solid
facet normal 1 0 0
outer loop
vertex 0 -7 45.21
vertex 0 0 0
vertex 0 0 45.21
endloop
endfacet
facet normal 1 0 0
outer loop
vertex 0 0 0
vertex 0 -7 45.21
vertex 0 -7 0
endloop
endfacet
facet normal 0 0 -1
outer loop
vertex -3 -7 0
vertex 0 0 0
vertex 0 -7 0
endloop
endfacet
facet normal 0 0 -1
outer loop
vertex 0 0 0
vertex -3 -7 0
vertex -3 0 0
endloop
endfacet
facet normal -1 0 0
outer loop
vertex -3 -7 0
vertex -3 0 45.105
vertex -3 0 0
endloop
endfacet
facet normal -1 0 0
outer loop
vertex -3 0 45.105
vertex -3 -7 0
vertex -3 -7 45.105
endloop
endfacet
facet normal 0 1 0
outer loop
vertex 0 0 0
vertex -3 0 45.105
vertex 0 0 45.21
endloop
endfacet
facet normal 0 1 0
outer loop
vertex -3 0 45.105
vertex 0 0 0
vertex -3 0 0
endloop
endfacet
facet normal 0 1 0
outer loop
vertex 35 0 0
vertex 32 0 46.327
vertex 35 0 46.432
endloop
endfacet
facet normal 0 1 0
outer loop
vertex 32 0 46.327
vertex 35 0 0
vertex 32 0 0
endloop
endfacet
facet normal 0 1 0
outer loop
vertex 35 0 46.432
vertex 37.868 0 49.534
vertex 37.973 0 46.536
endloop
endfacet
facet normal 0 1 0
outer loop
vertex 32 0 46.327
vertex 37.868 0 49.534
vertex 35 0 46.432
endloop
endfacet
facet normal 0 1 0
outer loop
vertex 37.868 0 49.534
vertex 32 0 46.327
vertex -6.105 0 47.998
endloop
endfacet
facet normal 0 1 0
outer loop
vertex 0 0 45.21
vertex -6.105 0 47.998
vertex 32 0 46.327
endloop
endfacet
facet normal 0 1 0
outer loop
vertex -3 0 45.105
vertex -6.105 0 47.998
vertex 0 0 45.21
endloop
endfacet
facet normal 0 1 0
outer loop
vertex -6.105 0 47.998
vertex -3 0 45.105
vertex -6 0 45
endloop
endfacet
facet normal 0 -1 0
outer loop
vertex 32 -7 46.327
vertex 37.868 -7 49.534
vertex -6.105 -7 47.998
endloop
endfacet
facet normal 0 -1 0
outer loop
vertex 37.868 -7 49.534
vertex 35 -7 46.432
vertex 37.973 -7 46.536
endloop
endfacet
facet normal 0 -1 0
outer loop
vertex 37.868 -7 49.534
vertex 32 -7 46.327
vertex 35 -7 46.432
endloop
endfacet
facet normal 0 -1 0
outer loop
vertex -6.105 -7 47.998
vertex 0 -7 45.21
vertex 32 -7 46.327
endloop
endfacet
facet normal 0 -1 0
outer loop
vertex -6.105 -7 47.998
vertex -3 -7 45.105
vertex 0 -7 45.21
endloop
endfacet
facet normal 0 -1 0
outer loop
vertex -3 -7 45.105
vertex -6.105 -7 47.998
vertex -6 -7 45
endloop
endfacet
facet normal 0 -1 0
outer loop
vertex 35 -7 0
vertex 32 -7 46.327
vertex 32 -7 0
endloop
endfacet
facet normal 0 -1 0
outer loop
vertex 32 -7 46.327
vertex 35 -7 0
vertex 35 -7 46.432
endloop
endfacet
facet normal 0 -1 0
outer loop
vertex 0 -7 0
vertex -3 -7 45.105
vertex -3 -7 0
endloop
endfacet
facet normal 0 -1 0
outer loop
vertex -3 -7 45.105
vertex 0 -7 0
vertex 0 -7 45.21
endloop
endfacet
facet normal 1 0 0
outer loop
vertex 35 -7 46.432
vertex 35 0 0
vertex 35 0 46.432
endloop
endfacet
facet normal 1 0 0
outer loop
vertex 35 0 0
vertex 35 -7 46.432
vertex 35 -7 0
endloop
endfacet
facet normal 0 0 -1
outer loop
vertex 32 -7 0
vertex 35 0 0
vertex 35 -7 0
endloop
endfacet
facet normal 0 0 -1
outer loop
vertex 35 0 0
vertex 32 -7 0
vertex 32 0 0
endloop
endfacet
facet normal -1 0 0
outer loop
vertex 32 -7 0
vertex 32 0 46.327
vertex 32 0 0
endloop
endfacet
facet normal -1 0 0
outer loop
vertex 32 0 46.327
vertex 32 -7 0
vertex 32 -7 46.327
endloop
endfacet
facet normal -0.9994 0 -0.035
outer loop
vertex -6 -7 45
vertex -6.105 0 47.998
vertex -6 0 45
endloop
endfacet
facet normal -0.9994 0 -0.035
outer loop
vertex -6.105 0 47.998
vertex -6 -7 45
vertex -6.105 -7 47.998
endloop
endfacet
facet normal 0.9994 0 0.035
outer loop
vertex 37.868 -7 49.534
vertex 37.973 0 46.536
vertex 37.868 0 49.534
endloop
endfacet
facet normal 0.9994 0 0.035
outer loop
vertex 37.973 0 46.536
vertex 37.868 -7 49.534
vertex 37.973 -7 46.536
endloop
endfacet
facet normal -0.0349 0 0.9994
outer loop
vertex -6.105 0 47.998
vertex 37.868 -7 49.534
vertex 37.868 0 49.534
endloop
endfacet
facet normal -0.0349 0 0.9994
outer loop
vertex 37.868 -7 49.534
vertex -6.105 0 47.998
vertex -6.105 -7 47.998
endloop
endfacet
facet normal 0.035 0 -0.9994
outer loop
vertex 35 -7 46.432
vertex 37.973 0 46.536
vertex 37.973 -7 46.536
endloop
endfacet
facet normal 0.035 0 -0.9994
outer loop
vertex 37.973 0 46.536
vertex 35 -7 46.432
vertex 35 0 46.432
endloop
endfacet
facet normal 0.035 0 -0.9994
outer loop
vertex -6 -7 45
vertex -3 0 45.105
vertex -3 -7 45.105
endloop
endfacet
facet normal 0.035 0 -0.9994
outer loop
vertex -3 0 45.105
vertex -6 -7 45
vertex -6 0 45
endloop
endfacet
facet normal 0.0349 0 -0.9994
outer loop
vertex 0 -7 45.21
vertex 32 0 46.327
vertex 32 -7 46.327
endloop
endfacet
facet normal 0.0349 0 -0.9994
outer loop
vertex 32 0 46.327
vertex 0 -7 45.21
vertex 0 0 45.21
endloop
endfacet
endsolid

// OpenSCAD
/* dooropening.scad
 *
 * Copyright (C) Robert B. Ross, 2016
 *
 * This software is released under the Creative Commons
 * Attribution-ShareAlike 4.0 International Public License.
 */

doorOpening();

/* doorOpening() -- create an opening where a door would go.
 *
 * cutout -- rather than creating the door with frame, creates a hull that
 *           can be used to diff out of a wall.
 *
 * NOTE: Positioned so that left back bottom corner of opening is at origin
 */
module doorOpening(width=32, height=45, thick=7, angle=2, cutout=0) {
   slop = 2;

   if (cutout) {
      translate([0,-thick,0]) cube([width,thick,height+slop]);
   }
   else {
      translate([-3,-thick,0]) cube([3, thick, height+slop]);
      translate([width,-thick,0]) cube([3, thick, height+slop]);

      translate([-6,-thick,height]) rotate([0,-angle,0])
         cube([width+12,thick,3]);
   }
}
